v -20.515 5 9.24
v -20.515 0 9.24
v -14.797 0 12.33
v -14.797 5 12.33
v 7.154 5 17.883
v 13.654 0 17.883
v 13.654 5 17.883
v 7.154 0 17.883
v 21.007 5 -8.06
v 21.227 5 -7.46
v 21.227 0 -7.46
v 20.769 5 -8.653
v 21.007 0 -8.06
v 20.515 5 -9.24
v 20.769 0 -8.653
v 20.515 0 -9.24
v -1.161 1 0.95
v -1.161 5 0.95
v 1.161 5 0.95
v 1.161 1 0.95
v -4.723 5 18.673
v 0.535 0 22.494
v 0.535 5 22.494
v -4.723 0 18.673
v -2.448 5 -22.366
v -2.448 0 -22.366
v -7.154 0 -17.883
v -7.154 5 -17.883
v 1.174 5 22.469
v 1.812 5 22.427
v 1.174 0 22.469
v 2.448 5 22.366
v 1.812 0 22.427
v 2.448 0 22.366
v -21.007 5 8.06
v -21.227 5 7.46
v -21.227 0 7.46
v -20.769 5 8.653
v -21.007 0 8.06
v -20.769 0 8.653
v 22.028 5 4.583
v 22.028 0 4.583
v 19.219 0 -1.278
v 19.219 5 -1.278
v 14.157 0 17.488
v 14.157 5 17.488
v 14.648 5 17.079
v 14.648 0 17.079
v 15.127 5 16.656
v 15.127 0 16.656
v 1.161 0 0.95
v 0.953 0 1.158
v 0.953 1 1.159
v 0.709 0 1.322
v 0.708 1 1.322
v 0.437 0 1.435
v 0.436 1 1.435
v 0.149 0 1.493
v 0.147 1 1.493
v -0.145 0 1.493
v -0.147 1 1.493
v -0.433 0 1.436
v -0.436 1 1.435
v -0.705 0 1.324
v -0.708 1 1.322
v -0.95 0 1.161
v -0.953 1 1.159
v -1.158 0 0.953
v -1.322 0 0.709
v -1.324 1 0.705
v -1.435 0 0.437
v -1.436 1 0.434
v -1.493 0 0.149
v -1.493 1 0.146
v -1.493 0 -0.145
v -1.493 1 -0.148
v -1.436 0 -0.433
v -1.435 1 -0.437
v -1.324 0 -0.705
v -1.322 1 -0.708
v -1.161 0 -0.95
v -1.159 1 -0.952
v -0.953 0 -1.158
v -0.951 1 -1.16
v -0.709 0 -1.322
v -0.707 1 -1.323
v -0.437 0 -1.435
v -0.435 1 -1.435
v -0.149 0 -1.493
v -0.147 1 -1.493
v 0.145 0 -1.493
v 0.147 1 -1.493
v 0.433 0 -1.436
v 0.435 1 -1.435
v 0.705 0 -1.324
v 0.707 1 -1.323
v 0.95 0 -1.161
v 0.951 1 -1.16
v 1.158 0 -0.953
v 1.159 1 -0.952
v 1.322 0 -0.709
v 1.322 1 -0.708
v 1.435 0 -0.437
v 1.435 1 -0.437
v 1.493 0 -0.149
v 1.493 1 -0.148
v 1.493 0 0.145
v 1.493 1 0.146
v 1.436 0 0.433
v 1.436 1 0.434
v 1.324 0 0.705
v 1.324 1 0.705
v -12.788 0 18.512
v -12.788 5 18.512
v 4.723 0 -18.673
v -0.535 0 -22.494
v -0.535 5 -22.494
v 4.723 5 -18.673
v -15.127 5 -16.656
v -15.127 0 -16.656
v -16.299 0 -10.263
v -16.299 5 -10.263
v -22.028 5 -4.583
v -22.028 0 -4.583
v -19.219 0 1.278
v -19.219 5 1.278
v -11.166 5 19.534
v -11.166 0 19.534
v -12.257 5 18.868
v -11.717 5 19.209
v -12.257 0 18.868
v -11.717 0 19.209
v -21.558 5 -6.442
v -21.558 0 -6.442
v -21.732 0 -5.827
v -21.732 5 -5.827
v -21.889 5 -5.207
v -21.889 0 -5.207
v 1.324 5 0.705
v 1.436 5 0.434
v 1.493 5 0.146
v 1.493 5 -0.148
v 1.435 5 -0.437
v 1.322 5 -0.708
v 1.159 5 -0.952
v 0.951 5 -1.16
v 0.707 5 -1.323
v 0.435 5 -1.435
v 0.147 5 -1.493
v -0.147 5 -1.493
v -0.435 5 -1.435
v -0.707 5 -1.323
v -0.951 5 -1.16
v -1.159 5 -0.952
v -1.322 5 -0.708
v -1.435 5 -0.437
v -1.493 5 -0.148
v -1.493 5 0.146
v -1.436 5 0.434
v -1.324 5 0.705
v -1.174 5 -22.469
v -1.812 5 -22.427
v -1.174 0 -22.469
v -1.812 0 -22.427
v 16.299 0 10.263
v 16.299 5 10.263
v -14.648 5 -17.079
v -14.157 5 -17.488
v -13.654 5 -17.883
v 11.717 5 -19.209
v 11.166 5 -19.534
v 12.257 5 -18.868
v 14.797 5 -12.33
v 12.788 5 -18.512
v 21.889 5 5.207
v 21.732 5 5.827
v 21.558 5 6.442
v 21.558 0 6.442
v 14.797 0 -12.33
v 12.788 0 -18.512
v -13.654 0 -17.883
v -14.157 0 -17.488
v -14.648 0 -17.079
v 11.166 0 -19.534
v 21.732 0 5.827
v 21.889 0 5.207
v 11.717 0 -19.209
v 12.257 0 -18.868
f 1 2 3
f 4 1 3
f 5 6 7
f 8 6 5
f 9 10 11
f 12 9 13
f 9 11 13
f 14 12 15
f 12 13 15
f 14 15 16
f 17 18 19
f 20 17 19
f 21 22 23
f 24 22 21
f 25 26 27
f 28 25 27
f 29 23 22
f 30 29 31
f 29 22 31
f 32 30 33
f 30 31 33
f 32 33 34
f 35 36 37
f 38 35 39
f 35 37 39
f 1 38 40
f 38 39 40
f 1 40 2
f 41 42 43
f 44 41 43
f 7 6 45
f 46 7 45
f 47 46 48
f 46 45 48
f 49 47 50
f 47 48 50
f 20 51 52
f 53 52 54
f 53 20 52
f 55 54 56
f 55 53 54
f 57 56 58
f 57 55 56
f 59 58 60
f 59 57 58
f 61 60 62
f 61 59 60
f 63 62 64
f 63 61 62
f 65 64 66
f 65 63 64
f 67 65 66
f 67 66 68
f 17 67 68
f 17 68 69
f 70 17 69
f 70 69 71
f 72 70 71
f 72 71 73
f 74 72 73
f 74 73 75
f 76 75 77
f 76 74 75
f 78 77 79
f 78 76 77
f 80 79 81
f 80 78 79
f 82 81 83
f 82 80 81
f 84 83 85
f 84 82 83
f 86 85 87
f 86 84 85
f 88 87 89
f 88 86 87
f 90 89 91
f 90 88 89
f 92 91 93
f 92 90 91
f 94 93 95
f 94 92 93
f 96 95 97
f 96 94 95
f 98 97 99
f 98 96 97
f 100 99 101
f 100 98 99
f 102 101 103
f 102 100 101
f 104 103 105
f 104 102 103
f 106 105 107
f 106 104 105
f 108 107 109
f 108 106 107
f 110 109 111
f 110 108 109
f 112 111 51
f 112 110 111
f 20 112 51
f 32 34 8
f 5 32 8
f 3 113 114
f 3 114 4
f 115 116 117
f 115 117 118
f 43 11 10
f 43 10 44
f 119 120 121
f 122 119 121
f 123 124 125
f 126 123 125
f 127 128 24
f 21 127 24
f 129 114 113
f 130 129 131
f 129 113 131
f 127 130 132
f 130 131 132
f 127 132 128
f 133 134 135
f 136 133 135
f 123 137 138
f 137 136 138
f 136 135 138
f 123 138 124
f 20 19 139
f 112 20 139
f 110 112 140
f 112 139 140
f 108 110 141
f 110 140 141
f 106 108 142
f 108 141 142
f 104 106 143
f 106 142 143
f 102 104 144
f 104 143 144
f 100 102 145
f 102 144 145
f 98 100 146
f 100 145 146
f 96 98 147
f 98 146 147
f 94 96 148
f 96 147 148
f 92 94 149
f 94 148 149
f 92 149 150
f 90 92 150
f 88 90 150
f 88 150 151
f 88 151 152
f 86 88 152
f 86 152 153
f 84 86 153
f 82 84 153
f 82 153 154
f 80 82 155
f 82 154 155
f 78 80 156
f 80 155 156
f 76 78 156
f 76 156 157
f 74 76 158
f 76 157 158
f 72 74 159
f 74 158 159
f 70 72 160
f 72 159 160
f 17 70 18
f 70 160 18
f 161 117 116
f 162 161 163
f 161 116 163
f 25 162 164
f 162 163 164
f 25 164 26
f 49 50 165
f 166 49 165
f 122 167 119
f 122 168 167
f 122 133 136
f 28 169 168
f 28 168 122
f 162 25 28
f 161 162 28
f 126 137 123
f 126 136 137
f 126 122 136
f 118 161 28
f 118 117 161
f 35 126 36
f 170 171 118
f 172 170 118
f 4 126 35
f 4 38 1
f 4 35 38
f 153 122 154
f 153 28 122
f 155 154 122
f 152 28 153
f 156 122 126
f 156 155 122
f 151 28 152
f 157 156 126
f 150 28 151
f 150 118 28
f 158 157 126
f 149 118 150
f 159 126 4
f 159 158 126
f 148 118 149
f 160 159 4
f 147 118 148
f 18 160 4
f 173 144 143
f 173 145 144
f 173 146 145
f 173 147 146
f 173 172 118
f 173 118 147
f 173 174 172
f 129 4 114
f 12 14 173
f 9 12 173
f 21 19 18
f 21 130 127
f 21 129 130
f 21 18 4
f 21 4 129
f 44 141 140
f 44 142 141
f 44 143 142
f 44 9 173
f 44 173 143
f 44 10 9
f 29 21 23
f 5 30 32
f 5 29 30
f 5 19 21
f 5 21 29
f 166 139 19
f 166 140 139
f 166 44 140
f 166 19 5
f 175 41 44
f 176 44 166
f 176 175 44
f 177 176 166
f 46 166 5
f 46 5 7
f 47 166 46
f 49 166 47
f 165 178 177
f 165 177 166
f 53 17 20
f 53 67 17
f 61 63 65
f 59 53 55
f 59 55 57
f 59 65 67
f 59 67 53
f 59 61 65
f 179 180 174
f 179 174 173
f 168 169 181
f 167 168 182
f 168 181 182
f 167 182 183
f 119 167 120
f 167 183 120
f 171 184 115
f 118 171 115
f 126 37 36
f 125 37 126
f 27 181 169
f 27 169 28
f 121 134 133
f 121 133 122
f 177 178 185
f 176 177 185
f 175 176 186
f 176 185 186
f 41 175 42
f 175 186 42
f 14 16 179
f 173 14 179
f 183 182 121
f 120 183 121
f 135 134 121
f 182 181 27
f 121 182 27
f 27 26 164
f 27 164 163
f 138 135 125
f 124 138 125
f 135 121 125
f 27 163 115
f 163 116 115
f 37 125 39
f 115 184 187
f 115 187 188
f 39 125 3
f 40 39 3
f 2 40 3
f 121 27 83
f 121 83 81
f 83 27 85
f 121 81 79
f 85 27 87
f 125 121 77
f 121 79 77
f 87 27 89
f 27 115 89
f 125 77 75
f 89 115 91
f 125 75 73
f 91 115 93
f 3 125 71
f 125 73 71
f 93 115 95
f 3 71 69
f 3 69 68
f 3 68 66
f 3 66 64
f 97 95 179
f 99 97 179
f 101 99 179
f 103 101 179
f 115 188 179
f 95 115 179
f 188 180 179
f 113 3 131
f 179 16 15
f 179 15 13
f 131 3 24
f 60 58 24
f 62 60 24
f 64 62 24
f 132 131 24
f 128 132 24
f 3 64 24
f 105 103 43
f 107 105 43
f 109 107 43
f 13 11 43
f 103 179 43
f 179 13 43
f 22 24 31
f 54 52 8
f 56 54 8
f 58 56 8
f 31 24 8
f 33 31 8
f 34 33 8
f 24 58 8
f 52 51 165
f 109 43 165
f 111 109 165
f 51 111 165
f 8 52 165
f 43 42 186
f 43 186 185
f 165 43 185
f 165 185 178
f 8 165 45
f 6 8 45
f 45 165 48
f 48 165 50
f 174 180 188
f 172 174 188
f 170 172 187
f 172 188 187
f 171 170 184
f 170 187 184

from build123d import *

# Parameters (mm, degrees)
SKETCH1_R               = 22.5
BOSS_EXTRUDE1_DEPTH     = 5
CUT_EXTRUDE1_DEPTH      = 4
CUT_EXTRUDE6_DEPTH      = 33.210246817
CUT_EXTRUDE6_DEPTH_BACK = 33.210246817
CUT_EXTRUDE7_START      = -1
SKETCH5_R               = 1.5
CUT_EXTRUDE7_DEPTH      = 1
CRVPATTERN3_COUNT       = 10


with BuildPart() as part:
    # Sketch1 → Boss-Extrude1 (new body)
    with BuildSketch(Plane(origin=(0, 0, 0), x_dir=(1, 0, 0), z_dir=(0, 1, 0))):
        with Locations(Location((0, 0, 0), (0, 0, 270))):
            Circle(SKETCH1_R)
    extrude(amount=BOSS_EXTRUDE1_DEPTH)

    # Sketch2 → Cut-Extrude1 (cut)
    with BuildSketch(Plane(origin=(0, 5, 0), x_dir=(1, 0, 0), z_dir=(0, 1, 0))):
        with BuildLine():
            Line((-1.160818677, -0.95), (1.160818677, -0.95))
            ThreePointArc((1.160818677, -0.95), (0, 1.5), (-1.160818677, -0.95))
        make_face()
    extrude(amount=-CUT_EXTRUDE1_DEPTH, mode=Mode.SUBTRACT)

    # Sketch4 → Cut-Extrude6 (cut, two sides: drawn at the far end of the back side and taken through both)
    with BuildSketch(Plane(origin=(0, 5, 0), x_dir=(1, 0, 0), z_dir=(0, 1, 0)).offset(-CUT_EXTRUDE6_DEPTH_BACK)):
        Polygon((83.285175452, 104.034655768), (-2.447970935, 22.36643553), (-7.154384821, 17.883170165), (-13.654384821, 17.883170165), (-132.059919263, 17.883170165), (-220.021178565, 237.751992892), (-4.67608385, 323.903478495), align=None)
    cut_extrude6 = extrude(amount=CUT_EXTRUDE6_DEPTH + CUT_EXTRUDE6_DEPTH_BACK, mode=Mode.SUBTRACT)

    # Sketch5 → Cut-Extrude7 (cut)
    with BuildSketch(Plane.XZ.offset(CUT_EXTRUDE7_START)):
        with Locations(Location((0, 0, 0), (0, 0, 39.296480239))):
            Circle(SKETCH5_R)
    extrude(amount=CUT_EXTRUDE7_DEPTH, mode=Mode.SUBTRACT)

    # CrvPattern3: Cut-Extrude6 ×10 about axis
    crvpattern3_axis = Axis((0, 0, 0), (0, -1, 0))
    for i in range(1, CRVPATTERN3_COUNT):
        add(cut_extrude6.rotate(crvpattern3_axis, i * 360 / CRVPATTERN3_COUNT), mode=Mode.SUBTRACT)


solid = part.part
